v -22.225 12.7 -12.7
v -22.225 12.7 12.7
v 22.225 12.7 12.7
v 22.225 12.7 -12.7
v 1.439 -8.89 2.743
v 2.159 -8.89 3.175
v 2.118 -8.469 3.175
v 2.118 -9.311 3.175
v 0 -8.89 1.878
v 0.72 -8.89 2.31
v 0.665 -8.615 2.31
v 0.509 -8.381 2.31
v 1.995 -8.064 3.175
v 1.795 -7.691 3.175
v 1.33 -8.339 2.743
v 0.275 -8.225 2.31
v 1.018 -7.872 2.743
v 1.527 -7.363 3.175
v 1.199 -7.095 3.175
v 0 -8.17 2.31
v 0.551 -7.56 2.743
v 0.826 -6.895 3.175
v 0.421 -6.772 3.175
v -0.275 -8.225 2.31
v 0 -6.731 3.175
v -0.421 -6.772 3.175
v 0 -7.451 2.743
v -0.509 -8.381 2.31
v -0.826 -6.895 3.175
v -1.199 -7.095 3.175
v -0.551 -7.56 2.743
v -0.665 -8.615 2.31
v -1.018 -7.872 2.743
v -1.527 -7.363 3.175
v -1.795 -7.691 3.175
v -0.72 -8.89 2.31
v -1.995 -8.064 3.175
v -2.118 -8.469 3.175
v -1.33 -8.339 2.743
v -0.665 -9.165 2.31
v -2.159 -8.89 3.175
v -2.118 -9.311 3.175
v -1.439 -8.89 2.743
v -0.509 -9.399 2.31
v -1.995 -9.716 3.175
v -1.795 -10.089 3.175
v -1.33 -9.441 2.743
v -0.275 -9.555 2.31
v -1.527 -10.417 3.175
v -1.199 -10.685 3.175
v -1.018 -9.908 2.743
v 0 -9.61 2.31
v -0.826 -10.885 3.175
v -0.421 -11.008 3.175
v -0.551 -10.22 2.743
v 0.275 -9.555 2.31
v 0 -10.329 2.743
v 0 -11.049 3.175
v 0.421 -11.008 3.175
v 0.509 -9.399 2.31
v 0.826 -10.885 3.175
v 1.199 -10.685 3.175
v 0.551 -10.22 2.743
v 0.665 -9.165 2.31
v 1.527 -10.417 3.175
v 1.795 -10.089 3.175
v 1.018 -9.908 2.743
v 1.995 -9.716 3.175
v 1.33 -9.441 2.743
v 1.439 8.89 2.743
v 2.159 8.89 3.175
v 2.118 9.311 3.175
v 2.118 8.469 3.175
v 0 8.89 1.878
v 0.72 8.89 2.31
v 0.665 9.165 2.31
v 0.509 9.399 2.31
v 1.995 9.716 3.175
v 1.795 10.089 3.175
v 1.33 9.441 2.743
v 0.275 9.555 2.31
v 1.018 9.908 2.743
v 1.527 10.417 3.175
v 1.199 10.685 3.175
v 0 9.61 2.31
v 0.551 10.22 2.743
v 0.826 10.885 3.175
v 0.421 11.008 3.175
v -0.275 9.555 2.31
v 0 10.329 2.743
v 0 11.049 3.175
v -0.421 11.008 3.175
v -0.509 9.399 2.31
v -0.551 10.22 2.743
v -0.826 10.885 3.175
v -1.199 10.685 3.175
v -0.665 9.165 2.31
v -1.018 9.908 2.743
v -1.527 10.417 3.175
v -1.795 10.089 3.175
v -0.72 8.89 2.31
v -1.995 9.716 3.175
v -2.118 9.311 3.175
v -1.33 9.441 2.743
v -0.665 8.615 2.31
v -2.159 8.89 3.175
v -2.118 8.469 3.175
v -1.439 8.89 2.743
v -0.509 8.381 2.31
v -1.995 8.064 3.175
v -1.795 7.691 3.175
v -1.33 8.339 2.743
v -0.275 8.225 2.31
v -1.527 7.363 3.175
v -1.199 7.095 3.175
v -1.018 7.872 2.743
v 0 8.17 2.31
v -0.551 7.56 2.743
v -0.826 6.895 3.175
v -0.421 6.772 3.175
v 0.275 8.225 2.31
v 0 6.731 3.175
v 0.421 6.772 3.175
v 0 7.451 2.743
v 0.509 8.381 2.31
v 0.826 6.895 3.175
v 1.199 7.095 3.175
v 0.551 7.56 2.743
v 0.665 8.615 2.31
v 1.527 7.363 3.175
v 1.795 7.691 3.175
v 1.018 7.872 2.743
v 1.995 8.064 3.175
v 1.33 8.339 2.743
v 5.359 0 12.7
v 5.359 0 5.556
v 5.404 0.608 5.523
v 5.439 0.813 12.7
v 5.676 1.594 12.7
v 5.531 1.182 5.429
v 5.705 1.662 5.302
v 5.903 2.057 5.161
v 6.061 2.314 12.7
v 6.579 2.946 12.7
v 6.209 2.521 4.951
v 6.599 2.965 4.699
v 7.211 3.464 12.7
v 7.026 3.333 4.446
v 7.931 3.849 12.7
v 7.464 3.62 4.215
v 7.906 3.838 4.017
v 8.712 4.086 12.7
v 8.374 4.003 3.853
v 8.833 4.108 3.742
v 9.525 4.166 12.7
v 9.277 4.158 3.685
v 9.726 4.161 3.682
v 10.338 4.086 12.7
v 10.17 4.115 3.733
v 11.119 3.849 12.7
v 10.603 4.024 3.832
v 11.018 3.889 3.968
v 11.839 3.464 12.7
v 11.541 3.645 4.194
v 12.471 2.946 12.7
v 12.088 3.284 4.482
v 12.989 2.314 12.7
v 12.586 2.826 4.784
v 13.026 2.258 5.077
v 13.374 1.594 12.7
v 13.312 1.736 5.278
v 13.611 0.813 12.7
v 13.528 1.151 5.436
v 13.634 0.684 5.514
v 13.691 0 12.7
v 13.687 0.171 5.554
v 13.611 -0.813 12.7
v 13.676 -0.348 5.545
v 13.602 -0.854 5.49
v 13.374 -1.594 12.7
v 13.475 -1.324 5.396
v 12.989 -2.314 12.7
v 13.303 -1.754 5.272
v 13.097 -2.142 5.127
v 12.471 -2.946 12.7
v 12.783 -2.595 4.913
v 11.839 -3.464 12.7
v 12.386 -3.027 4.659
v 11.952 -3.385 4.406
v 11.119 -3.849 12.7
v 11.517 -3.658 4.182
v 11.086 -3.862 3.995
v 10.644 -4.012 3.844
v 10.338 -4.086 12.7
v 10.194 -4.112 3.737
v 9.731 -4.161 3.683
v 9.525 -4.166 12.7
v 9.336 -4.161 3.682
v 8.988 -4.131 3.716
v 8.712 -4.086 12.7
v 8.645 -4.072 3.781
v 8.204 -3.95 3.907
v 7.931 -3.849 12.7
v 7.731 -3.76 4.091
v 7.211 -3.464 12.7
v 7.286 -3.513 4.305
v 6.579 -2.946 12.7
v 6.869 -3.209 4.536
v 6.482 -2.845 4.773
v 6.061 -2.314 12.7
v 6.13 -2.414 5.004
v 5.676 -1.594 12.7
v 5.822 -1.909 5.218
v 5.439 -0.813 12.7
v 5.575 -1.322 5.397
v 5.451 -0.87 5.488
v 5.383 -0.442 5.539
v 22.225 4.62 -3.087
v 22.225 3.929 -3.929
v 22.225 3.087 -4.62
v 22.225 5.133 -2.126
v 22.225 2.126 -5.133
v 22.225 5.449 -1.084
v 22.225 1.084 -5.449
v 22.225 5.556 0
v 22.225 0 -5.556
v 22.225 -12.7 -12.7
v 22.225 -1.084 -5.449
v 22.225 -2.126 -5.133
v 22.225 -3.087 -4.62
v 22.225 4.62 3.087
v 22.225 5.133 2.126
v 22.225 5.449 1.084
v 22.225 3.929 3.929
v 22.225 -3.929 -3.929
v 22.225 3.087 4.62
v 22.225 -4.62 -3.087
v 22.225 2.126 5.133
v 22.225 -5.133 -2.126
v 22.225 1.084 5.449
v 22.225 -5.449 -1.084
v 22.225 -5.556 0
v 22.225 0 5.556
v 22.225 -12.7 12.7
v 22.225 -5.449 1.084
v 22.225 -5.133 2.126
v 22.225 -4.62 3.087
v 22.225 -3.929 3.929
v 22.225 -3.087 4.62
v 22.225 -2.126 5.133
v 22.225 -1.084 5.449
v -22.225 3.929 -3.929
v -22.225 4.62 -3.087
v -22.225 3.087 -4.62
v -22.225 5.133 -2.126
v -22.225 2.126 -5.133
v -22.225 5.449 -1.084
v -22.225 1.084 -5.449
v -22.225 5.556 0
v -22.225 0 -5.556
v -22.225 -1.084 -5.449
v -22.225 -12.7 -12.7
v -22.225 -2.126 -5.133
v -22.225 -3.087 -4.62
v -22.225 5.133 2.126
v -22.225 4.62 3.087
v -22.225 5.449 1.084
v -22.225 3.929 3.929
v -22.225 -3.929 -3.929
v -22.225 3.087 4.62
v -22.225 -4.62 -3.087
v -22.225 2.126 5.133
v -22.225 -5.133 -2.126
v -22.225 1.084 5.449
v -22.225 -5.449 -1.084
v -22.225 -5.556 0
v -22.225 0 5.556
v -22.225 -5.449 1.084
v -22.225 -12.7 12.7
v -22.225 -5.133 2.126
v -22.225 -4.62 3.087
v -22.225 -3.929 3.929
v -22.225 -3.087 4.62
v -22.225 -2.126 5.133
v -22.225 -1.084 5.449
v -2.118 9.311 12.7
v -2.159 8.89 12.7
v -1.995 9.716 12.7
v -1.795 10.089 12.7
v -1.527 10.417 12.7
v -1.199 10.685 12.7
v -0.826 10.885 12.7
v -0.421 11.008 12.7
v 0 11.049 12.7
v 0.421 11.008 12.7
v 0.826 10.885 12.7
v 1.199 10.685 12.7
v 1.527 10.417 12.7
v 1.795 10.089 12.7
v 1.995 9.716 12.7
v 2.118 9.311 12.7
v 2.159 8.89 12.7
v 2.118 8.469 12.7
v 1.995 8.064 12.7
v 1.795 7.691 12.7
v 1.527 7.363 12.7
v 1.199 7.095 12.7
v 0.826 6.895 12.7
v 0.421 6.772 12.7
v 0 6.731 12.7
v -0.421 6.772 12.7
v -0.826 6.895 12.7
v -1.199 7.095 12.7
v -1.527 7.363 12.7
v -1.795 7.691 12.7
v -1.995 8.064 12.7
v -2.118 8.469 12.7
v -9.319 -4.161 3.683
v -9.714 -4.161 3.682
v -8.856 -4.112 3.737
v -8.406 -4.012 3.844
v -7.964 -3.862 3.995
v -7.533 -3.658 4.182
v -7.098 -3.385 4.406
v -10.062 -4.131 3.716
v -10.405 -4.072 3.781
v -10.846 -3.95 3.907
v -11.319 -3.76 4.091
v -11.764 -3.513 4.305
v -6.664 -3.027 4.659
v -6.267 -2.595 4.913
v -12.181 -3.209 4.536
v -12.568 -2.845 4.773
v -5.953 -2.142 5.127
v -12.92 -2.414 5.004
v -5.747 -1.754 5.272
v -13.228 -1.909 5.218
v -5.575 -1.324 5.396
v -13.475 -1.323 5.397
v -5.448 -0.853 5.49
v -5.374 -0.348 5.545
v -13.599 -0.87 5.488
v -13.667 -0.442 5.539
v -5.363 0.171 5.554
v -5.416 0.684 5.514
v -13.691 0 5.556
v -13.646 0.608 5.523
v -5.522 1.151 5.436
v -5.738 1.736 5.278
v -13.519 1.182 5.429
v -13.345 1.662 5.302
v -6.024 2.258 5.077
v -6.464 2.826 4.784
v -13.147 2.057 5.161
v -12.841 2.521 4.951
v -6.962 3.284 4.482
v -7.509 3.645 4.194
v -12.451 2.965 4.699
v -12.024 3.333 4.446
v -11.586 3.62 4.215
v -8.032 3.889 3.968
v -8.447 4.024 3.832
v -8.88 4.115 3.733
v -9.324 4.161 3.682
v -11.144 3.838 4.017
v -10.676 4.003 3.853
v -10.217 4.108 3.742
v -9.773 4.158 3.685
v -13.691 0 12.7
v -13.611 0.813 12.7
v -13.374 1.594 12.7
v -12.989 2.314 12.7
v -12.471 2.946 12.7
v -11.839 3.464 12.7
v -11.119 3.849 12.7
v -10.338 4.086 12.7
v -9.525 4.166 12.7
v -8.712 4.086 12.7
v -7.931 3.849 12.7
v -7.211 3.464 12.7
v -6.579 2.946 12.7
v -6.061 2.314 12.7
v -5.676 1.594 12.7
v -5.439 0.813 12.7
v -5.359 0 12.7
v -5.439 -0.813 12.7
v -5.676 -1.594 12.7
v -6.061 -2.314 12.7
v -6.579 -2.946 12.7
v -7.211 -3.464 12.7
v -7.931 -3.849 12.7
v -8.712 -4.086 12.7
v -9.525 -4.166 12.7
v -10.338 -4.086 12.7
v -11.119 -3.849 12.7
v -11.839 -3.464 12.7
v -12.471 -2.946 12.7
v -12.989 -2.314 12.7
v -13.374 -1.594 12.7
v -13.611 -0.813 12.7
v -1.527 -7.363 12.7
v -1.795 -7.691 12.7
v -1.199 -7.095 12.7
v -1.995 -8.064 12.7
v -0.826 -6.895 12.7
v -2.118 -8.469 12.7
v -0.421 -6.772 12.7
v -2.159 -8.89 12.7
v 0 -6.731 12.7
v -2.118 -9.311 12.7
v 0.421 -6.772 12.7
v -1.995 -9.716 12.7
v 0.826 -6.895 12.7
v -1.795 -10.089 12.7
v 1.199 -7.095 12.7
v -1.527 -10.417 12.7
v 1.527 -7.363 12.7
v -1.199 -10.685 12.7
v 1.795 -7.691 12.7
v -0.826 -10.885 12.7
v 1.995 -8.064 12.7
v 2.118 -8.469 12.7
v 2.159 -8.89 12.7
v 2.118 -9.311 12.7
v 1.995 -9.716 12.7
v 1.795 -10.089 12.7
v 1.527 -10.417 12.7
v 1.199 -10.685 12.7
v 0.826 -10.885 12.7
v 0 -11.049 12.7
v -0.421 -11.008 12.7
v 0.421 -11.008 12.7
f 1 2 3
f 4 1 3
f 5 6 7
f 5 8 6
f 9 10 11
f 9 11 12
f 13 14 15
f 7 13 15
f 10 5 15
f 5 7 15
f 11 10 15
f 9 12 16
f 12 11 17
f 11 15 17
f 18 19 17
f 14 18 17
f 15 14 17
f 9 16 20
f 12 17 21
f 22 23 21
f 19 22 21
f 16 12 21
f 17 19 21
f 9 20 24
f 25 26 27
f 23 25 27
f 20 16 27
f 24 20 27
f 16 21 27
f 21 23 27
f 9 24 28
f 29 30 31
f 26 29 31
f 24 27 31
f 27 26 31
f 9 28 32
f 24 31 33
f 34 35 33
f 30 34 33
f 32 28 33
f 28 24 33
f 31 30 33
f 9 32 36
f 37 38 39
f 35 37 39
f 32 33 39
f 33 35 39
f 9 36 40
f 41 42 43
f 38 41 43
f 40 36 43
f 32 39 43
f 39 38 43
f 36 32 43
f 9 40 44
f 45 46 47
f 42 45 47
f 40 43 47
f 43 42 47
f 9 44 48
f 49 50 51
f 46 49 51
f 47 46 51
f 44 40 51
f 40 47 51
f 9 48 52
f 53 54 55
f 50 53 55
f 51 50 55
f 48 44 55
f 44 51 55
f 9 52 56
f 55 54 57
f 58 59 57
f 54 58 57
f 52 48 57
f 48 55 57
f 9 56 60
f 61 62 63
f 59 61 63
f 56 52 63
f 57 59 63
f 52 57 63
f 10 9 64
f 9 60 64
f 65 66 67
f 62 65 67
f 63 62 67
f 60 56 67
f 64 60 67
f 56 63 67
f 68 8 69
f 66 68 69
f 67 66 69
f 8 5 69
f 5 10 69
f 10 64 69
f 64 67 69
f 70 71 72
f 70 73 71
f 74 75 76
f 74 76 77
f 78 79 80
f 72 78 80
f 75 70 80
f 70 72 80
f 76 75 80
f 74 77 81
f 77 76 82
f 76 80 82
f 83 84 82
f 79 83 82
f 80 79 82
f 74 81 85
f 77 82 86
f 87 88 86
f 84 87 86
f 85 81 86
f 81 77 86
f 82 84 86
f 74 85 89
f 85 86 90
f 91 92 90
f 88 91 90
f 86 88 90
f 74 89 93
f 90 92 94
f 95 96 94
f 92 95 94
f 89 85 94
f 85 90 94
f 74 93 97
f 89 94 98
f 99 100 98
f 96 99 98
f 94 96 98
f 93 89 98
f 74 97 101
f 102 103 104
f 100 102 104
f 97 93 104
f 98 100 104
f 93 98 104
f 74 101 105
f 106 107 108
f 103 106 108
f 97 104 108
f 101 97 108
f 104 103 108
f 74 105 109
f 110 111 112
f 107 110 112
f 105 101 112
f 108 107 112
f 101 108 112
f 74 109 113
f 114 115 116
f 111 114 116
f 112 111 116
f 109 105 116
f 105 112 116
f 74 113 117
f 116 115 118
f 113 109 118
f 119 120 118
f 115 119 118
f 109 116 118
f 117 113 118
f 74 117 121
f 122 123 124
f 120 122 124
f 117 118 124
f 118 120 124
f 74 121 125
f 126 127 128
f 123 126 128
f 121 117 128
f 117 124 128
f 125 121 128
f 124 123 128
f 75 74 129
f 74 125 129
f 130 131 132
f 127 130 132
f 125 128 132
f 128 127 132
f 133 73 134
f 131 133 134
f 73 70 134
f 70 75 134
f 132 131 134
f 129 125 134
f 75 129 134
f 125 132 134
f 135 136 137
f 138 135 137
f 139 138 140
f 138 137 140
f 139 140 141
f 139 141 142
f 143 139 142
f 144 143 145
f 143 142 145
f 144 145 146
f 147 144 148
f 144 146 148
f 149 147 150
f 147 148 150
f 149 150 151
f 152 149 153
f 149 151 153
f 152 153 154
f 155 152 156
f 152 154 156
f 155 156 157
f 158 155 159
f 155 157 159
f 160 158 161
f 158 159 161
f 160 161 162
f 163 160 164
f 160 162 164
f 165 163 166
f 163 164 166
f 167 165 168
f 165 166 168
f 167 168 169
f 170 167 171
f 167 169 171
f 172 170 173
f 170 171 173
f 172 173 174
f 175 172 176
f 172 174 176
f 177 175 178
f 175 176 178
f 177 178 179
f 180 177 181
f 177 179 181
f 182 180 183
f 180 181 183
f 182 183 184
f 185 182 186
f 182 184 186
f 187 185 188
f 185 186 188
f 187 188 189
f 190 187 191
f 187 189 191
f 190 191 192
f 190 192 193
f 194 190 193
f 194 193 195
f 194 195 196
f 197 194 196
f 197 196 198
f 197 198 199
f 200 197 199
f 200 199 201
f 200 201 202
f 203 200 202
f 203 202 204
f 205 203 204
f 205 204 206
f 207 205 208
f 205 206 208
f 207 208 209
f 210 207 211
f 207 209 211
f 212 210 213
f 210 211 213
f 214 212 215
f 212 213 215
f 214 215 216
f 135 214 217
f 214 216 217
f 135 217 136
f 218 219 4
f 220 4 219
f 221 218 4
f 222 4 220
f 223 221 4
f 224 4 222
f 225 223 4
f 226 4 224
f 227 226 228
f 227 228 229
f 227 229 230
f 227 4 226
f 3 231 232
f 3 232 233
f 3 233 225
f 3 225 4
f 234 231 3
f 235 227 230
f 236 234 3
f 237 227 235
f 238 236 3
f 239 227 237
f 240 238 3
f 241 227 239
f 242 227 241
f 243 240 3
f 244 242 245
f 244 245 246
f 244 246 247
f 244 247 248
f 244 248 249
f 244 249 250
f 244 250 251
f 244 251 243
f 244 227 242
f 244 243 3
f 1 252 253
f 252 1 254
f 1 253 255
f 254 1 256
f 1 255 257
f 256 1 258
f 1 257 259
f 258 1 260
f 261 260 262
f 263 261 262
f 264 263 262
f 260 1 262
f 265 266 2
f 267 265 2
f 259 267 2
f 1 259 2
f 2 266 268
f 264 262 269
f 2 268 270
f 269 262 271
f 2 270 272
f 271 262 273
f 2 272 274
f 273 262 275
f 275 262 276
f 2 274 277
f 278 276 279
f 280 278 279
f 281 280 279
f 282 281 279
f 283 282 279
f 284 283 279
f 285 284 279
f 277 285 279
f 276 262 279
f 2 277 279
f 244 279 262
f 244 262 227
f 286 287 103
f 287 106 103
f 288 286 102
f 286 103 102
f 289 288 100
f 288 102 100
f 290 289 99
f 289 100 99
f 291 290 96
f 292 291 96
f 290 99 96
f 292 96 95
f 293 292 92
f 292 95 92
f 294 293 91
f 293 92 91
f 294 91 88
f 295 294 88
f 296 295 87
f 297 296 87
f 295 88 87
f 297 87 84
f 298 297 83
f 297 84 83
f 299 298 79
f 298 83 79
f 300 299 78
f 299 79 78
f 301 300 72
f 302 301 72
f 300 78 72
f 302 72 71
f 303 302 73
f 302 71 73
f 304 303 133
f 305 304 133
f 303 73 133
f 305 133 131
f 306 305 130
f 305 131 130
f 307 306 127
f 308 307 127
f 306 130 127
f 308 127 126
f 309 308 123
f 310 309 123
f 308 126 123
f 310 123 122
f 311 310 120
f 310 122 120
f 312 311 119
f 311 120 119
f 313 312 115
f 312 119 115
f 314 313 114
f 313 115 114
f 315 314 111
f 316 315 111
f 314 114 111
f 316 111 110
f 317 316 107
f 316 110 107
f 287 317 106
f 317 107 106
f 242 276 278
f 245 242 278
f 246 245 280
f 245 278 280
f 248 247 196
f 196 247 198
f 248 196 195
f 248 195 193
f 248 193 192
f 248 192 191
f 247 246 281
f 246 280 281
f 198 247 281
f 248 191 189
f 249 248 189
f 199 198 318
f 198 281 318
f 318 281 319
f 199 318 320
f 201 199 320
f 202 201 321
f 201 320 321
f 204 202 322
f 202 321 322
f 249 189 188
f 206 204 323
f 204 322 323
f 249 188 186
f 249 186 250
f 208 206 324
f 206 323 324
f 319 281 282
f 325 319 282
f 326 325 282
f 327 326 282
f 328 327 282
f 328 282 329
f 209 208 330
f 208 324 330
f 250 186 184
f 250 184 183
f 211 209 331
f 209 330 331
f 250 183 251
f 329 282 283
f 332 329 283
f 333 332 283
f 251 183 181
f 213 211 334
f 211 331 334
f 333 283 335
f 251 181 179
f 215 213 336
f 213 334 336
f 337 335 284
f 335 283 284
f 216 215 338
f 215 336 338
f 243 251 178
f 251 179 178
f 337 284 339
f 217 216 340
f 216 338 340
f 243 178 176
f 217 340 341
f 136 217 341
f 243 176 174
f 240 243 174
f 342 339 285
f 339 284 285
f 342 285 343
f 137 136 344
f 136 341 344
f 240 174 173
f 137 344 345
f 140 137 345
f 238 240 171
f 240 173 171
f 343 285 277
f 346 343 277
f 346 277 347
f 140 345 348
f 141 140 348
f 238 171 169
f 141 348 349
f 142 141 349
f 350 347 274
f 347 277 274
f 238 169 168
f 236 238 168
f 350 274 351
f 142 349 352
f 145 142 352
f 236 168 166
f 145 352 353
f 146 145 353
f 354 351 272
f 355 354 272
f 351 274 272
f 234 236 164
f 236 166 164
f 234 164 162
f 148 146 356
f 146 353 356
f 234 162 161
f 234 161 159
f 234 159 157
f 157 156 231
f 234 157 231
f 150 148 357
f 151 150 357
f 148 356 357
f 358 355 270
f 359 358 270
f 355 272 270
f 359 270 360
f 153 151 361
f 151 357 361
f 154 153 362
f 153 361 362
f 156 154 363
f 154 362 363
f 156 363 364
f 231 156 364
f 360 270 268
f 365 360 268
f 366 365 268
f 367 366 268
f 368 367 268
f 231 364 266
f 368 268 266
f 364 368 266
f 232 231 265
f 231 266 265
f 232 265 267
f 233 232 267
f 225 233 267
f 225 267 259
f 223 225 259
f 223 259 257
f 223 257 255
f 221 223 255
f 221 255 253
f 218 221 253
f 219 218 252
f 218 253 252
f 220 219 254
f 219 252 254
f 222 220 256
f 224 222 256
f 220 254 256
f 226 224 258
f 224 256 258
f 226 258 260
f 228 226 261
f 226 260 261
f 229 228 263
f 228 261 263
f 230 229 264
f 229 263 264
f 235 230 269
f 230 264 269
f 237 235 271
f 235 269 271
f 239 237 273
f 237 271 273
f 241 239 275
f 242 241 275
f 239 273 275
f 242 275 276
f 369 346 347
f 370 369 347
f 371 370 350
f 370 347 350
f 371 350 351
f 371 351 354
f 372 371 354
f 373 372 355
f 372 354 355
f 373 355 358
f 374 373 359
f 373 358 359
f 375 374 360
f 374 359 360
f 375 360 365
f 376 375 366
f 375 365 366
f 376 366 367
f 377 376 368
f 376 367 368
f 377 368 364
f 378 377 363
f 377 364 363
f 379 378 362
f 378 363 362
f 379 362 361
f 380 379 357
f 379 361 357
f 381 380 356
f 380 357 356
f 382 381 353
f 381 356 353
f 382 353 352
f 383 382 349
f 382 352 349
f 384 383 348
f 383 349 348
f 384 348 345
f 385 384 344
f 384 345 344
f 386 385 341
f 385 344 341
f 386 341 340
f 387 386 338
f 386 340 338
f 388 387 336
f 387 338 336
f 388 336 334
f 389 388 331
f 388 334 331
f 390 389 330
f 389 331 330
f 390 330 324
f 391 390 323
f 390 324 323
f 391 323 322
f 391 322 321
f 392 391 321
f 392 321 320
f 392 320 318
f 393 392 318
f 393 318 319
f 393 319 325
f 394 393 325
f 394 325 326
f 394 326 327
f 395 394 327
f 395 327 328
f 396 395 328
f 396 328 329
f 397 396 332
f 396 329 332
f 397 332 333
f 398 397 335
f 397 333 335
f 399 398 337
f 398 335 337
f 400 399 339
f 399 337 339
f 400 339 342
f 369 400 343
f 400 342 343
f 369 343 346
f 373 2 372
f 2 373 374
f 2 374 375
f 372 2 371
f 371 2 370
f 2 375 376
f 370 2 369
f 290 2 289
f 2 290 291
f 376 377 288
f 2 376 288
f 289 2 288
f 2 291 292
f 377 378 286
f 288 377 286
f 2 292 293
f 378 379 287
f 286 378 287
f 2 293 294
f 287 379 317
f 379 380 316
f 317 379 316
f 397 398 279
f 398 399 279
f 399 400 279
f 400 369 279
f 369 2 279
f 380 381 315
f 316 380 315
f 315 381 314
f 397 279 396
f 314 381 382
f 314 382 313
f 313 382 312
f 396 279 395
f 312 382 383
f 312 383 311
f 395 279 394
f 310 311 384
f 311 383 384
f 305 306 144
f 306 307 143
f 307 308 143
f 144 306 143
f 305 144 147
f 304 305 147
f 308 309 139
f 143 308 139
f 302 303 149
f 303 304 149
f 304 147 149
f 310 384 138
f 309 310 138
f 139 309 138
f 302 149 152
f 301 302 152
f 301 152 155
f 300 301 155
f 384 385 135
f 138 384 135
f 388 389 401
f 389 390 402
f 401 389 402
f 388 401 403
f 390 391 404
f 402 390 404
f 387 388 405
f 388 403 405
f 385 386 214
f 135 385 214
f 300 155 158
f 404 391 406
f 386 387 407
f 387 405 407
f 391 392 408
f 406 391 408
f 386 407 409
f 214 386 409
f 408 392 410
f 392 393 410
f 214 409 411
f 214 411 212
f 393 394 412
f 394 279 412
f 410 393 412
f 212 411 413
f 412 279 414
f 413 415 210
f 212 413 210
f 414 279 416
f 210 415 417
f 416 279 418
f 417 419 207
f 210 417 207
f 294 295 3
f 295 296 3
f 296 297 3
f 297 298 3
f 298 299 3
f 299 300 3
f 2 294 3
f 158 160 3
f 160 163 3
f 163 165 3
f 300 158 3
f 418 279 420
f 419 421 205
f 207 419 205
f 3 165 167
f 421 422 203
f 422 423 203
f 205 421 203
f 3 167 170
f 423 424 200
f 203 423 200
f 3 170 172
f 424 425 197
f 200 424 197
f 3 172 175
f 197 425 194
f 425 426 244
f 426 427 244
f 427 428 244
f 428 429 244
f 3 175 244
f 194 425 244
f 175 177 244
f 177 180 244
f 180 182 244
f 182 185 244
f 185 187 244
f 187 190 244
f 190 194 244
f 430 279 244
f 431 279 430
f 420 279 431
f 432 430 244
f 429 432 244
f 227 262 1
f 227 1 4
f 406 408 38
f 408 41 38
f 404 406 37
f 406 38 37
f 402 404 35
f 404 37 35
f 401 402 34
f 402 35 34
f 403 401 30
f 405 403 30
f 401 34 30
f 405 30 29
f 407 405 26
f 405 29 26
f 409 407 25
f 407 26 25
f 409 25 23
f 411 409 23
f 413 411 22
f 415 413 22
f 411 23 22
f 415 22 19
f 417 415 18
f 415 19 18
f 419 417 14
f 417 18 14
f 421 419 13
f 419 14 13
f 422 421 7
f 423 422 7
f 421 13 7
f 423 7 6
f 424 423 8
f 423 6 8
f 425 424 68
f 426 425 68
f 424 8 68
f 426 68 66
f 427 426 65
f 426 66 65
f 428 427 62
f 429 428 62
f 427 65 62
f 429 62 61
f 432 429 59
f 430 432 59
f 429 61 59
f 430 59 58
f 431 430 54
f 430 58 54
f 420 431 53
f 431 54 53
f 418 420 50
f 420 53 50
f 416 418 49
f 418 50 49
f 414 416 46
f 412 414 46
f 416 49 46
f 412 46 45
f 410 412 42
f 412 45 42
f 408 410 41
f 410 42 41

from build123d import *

# Parameters (mm, degrees)
F0_W     = 44.45
F0_H     = 25.4
F1_DEPTH = 12.7
F4_D     = 8.3312
F4_DEPTH = 12.7
F4_TIP   = 2.5029449946
F5_D     = 8.3312
F5_DEPTH = 12.7
F5_TIP   = 2.5029449946
F6_D     = 4.318
F6_DEPTH = 9.525
F6_TIP   = 1.2972580765
F7_D     = 11.1125


with BuildPart() as f1:
    # F0 (on Front) → F1 (new body, symmetric)
    with BuildSketch(Plane.XZ):
        Rectangle(F0_W, F0_H)
    extrude(amount=F1_DEPTH, both=True)

    # F4
    with Locations(Plane.XY.offset(12.7)):
        with Locations((-9.525, 0)):
            Hole(F4_D / 2, depth=F4_DEPTH)
            with Locations((0, 0, -(F4_DEPTH + F4_TIP / 2))):  # 118° drill point
                Cone(0, F4_D / 2, F4_TIP, mode=Mode.SUBTRACT)

    # F5
    with Locations(Plane.XY.offset(12.7)):
        with Locations((9.525, 0)):
            Hole(F5_D / 2, depth=F5_DEPTH)
            with Locations((0, 0, -(F5_DEPTH + F5_TIP / 2))):  # 118° drill point
                Cone(0, F5_D / 2, F5_TIP, mode=Mode.SUBTRACT)

    # F6
    with Locations(Plane.XY.offset(12.7)):
        with Locations((0, 8.89), (0, -8.89)):
            Hole(F6_D / 2, depth=F6_DEPTH)
            with Locations((0, 0, -(F6_DEPTH + F6_TIP / 2))):  # 118° drill point
                Cone(0, F6_D / 2, F6_TIP, mode=Mode.SUBTRACT)

    # F7 (through all)
    with Locations(Plane.YZ.offset(22.225)):
        with Locations((0, 0)):
            Hole(F7_D / 2)


solid = f1.part
